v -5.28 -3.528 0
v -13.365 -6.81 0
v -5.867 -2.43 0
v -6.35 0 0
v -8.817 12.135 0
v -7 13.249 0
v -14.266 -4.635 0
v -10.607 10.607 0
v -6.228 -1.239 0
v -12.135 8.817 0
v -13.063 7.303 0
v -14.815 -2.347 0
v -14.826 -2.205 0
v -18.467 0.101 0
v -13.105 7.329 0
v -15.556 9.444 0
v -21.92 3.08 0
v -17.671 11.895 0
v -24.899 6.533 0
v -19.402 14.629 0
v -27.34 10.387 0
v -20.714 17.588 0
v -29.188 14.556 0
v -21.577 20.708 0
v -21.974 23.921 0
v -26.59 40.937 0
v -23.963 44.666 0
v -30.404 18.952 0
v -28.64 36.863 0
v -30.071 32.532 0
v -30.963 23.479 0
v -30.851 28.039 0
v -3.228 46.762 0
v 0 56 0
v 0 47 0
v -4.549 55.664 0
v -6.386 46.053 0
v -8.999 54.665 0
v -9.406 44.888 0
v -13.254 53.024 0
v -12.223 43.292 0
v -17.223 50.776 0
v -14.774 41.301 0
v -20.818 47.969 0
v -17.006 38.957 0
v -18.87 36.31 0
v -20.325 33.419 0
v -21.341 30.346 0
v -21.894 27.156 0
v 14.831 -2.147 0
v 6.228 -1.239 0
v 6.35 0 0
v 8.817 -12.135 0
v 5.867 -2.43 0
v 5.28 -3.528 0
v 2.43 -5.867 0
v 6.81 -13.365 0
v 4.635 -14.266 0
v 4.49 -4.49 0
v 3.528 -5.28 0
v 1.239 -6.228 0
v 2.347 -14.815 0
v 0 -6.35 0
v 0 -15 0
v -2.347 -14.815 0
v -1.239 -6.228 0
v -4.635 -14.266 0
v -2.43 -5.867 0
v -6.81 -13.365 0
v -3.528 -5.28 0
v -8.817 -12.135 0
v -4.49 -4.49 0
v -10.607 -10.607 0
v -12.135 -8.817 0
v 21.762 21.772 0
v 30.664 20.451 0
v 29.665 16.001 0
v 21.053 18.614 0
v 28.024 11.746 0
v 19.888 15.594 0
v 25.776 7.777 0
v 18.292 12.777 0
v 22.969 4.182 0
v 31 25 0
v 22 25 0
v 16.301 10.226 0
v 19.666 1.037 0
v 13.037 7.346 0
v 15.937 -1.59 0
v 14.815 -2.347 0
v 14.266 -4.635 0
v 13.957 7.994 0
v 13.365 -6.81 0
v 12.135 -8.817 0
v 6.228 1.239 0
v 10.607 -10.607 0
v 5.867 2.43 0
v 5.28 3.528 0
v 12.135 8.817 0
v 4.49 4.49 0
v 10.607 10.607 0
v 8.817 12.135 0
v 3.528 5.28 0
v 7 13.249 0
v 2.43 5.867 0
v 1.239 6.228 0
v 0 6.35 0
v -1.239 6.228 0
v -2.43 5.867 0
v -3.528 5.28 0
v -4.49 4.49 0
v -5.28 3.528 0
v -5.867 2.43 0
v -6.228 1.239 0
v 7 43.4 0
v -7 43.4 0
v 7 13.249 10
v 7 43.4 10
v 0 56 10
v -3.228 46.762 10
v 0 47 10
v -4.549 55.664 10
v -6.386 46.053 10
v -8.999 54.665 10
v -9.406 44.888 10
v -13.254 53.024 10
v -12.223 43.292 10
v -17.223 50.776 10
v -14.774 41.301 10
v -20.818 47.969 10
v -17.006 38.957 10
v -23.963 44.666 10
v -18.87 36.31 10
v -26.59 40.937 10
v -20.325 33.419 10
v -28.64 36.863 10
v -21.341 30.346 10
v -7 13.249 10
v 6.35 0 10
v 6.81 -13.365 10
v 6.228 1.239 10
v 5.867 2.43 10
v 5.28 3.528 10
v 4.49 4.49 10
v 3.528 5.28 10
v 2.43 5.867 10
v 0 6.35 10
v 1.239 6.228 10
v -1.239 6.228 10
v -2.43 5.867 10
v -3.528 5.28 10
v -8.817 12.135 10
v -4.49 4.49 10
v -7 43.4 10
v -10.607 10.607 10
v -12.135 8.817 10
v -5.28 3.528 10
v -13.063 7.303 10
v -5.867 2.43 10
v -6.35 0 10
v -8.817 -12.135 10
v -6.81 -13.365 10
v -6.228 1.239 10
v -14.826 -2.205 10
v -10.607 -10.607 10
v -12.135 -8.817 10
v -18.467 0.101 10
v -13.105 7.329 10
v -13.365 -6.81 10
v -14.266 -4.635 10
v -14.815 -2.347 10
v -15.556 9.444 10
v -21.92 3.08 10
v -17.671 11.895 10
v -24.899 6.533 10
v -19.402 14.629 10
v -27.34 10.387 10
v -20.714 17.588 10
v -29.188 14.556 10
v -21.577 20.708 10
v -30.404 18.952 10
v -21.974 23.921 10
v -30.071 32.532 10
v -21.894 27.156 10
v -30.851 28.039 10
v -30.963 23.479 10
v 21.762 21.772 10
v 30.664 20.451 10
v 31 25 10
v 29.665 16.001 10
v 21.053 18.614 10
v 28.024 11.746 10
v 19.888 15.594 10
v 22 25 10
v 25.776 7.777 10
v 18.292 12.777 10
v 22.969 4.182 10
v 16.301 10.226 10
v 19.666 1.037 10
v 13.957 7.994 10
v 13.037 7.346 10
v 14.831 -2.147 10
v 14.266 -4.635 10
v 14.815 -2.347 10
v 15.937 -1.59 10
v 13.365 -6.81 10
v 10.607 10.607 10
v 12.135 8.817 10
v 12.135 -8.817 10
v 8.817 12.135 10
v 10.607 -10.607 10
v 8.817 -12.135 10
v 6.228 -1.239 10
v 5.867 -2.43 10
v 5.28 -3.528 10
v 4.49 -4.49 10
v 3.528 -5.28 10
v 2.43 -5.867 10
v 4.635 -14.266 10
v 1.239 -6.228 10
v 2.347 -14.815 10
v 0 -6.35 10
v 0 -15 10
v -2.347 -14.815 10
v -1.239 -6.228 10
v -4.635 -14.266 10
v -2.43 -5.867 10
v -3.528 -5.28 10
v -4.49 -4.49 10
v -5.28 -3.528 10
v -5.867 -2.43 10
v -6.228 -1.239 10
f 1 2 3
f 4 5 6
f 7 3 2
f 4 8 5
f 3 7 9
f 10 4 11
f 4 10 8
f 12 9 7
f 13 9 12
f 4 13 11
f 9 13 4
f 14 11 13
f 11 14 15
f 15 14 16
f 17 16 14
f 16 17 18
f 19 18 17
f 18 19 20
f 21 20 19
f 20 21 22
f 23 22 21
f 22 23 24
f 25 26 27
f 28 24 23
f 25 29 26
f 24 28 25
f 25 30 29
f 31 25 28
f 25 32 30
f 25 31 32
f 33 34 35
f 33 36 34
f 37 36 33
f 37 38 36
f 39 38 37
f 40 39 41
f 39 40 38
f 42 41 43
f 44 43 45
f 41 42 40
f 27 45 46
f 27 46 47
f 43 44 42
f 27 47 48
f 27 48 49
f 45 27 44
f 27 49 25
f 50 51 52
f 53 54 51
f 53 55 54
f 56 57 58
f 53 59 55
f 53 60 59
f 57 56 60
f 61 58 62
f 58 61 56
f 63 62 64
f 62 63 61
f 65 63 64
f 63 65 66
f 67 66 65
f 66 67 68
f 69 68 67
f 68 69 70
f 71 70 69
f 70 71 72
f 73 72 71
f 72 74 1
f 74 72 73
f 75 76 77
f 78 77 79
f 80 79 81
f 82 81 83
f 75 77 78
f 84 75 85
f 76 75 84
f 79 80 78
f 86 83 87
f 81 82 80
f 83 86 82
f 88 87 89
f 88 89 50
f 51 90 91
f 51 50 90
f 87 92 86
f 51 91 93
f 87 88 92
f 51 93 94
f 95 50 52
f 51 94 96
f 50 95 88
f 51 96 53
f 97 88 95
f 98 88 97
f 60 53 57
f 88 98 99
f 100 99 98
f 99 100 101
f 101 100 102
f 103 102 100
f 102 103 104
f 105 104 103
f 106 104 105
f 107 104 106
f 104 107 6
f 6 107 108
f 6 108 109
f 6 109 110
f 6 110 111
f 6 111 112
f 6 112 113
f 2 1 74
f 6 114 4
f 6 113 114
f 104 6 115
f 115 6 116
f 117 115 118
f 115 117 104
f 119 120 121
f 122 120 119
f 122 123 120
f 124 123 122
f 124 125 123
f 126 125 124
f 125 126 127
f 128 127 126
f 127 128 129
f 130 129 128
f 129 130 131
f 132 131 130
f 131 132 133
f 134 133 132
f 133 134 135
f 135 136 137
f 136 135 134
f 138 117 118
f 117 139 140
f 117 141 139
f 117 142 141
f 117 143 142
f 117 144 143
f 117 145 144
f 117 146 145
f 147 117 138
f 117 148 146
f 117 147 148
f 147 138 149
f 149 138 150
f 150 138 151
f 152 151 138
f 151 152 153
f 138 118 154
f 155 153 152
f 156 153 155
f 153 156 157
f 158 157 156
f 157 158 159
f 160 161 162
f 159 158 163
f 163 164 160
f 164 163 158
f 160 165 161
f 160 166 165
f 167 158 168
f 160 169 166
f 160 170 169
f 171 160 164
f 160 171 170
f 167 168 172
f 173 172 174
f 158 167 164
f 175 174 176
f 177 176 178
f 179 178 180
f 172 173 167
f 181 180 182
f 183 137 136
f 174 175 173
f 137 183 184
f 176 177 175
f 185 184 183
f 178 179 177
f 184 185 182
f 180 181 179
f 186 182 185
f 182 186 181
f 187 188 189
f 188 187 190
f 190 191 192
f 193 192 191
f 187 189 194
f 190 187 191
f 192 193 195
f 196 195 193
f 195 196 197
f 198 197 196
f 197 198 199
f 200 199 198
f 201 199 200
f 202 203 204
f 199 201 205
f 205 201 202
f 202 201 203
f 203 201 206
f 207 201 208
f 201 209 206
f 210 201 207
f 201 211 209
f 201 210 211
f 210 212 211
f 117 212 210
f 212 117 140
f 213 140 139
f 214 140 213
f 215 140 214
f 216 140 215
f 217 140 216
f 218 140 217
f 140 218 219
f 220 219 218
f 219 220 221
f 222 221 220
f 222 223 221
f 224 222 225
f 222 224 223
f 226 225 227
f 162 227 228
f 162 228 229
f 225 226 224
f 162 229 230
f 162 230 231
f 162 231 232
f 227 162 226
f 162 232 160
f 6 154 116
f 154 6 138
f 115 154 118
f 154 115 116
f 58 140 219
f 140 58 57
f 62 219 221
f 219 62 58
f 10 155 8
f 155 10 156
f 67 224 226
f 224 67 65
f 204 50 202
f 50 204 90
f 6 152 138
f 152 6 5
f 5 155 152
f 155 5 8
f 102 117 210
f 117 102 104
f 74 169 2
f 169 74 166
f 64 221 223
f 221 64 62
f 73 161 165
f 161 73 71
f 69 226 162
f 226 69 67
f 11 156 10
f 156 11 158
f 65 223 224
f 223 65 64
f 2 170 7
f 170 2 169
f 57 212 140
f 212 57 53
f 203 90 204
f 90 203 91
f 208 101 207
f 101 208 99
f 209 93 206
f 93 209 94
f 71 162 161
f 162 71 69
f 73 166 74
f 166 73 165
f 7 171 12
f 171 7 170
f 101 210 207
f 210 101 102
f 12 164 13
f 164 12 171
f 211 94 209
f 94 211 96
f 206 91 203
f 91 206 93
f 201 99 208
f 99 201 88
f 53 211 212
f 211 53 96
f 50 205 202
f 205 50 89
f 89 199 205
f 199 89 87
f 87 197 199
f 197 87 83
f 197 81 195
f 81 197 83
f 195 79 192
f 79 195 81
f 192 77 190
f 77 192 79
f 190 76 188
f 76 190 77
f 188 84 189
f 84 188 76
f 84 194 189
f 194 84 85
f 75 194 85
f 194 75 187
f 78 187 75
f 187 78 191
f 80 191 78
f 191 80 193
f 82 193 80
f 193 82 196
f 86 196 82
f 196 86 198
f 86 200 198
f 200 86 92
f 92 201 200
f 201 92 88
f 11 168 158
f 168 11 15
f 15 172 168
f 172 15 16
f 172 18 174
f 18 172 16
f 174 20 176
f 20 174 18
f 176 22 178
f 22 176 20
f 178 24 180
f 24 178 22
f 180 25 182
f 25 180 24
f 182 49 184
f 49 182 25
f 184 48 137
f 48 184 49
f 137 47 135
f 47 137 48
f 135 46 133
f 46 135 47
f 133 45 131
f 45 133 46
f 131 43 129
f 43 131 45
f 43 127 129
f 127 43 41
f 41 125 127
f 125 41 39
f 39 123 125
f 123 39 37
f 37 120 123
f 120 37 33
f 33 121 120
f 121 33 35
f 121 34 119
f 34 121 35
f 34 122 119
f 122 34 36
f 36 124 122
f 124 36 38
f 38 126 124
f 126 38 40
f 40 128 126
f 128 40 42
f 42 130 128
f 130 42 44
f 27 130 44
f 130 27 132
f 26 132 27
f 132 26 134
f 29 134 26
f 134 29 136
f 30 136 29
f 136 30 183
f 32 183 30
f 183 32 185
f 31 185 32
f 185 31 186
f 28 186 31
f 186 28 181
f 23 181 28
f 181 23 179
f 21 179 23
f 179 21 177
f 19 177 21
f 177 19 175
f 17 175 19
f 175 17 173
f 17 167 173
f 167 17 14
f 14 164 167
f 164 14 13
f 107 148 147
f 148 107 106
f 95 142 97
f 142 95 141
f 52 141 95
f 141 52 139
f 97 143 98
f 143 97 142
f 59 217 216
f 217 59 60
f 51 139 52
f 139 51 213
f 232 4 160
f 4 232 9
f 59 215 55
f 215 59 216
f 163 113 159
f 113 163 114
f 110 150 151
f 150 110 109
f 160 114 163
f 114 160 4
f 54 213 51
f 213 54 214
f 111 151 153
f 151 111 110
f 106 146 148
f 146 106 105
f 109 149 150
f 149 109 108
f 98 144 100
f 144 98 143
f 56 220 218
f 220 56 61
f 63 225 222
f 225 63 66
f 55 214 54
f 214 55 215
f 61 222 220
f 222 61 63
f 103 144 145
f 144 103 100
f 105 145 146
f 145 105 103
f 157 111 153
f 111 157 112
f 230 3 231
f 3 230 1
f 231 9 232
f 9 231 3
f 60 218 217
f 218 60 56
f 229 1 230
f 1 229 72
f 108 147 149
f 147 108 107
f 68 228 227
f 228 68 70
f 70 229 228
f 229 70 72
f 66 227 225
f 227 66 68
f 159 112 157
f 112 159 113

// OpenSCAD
$fn = 32;

// ----------------------------------------------------------------------
// Hook: 50 mm shank into a 22 mm curl, 10 mm thick
// ----------------------------------------------------------------------

// --- parameters (mm) ---
shank_len = 50;           // shank length from the boss centre
shank_w = 14;             // shank width
boss_d = 30;              // boss diameter
bore_d = 12.7;            // boss bore
curl_in = 22;             // curl inner radius
curl_out = 31;            // curl outer radius
curl_sweep = 270;         // curl sweep angle
hook_t = 10;              // hook thickness

shank_profile = [[-7, 43.4], [7, 43.4], [7, 13], [-7, 13]];
boss_profile = [[15, 0], [14.815, 2.347], [14.266, 4.635], [13.365, 6.81], [12.135, 8.817], [10.607, 10.607], [8.817, 12.135], [6.81, 13.365], [4.635, 14.266], [2.347, 14.815], [0, 15], [-2.347, 14.815], [-4.635, 14.266], [-6.81, 13.365], [-8.817, 12.135], [-10.607, 10.607], [-12.135, 8.817], [-13.365, 6.81], [-14.266, 4.635], [-14.815, 2.347], [-15, 0], [-14.815, -2.347], [-14.266, -4.635], [-13.365, -6.81], [-12.135, -8.817], [-10.607, -10.607], [-8.817, -12.135], [-6.81, -13.365], [-4.635, -14.266], [-2.347, -14.815], [0, -15], [2.347, -14.815], [4.635, -14.266], [6.81, -13.365], [8.817, -12.135], [10.607, -10.607], [12.135, -8.817], [13.365, -6.81], [14.266, -4.635], [14.815, -2.347]];
curl_profile = [[0, 56], [-4.549, 55.664], [-8.999, 54.665], [-13.254, 53.024], [-17.223, 50.776], [-20.818, 47.969], [-23.963, 44.666], [-26.59, 40.937], [-28.64, 36.863], [-30.071, 32.532], [-30.851, 28.039], [-30.963, 23.479], [-30.404, 18.952], [-29.188, 14.556], [-27.34, 10.387], [-24.899, 6.533], [-21.92, 3.08], [-18.467, 0.101], [-14.613, -2.34], [-10.444, -4.188], [-6.048, -5.404], [-1.521, -5.963], [3.039, -5.851], [7.532, -5.071], [11.863, -3.64], [15.937, -1.59], [19.666, 1.037], [22.969, 4.182], [25.776, 7.777], [28.024, 11.746], [29.665, 16.001], [30.664, 20.451], [31, 25], [22, 25], [21.762, 21.772], [21.053, 18.614], [19.888, 15.594], [18.292, 12.777], [16.301, 10.226], [13.957, 7.994], [11.31, 6.13], [8.419, 4.675], [5.346, 3.659], [2.156, 3.106], [-1.079, 3.026], [-4.292, 3.423], [-7.412, 4.286], [-10.371, 5.598], [-13.105, 7.329], [-15.556, 9.444], [-17.671, 11.895], [-19.402, 14.629], [-20.714, 17.588], [-21.577, 20.708], [-21.974, 23.921], [-21.894, 27.156], [-21.341, 30.346], [-20.325, 33.419], [-18.87, 36.31], [-17.006, 38.957], [-14.774, 41.301], [-12.223, 43.292], [-9.406, 44.888], [-6.386, 46.053], [-3.228, 46.762], [0, 47]];

difference() {
  union() {
    /* three overlapping outlines: shank, boss and the smooth curl */
    linear_extrude(height = hook_t) polygon(shank_profile);
    linear_extrude(height = hook_t) polygon(boss_profile);
    linear_extrude(height = hook_t) polygon(curl_profile);
  }
  translate([0, 0, -2.5]) cylinder(h = hook_t + 5, d = bore_d);
}
